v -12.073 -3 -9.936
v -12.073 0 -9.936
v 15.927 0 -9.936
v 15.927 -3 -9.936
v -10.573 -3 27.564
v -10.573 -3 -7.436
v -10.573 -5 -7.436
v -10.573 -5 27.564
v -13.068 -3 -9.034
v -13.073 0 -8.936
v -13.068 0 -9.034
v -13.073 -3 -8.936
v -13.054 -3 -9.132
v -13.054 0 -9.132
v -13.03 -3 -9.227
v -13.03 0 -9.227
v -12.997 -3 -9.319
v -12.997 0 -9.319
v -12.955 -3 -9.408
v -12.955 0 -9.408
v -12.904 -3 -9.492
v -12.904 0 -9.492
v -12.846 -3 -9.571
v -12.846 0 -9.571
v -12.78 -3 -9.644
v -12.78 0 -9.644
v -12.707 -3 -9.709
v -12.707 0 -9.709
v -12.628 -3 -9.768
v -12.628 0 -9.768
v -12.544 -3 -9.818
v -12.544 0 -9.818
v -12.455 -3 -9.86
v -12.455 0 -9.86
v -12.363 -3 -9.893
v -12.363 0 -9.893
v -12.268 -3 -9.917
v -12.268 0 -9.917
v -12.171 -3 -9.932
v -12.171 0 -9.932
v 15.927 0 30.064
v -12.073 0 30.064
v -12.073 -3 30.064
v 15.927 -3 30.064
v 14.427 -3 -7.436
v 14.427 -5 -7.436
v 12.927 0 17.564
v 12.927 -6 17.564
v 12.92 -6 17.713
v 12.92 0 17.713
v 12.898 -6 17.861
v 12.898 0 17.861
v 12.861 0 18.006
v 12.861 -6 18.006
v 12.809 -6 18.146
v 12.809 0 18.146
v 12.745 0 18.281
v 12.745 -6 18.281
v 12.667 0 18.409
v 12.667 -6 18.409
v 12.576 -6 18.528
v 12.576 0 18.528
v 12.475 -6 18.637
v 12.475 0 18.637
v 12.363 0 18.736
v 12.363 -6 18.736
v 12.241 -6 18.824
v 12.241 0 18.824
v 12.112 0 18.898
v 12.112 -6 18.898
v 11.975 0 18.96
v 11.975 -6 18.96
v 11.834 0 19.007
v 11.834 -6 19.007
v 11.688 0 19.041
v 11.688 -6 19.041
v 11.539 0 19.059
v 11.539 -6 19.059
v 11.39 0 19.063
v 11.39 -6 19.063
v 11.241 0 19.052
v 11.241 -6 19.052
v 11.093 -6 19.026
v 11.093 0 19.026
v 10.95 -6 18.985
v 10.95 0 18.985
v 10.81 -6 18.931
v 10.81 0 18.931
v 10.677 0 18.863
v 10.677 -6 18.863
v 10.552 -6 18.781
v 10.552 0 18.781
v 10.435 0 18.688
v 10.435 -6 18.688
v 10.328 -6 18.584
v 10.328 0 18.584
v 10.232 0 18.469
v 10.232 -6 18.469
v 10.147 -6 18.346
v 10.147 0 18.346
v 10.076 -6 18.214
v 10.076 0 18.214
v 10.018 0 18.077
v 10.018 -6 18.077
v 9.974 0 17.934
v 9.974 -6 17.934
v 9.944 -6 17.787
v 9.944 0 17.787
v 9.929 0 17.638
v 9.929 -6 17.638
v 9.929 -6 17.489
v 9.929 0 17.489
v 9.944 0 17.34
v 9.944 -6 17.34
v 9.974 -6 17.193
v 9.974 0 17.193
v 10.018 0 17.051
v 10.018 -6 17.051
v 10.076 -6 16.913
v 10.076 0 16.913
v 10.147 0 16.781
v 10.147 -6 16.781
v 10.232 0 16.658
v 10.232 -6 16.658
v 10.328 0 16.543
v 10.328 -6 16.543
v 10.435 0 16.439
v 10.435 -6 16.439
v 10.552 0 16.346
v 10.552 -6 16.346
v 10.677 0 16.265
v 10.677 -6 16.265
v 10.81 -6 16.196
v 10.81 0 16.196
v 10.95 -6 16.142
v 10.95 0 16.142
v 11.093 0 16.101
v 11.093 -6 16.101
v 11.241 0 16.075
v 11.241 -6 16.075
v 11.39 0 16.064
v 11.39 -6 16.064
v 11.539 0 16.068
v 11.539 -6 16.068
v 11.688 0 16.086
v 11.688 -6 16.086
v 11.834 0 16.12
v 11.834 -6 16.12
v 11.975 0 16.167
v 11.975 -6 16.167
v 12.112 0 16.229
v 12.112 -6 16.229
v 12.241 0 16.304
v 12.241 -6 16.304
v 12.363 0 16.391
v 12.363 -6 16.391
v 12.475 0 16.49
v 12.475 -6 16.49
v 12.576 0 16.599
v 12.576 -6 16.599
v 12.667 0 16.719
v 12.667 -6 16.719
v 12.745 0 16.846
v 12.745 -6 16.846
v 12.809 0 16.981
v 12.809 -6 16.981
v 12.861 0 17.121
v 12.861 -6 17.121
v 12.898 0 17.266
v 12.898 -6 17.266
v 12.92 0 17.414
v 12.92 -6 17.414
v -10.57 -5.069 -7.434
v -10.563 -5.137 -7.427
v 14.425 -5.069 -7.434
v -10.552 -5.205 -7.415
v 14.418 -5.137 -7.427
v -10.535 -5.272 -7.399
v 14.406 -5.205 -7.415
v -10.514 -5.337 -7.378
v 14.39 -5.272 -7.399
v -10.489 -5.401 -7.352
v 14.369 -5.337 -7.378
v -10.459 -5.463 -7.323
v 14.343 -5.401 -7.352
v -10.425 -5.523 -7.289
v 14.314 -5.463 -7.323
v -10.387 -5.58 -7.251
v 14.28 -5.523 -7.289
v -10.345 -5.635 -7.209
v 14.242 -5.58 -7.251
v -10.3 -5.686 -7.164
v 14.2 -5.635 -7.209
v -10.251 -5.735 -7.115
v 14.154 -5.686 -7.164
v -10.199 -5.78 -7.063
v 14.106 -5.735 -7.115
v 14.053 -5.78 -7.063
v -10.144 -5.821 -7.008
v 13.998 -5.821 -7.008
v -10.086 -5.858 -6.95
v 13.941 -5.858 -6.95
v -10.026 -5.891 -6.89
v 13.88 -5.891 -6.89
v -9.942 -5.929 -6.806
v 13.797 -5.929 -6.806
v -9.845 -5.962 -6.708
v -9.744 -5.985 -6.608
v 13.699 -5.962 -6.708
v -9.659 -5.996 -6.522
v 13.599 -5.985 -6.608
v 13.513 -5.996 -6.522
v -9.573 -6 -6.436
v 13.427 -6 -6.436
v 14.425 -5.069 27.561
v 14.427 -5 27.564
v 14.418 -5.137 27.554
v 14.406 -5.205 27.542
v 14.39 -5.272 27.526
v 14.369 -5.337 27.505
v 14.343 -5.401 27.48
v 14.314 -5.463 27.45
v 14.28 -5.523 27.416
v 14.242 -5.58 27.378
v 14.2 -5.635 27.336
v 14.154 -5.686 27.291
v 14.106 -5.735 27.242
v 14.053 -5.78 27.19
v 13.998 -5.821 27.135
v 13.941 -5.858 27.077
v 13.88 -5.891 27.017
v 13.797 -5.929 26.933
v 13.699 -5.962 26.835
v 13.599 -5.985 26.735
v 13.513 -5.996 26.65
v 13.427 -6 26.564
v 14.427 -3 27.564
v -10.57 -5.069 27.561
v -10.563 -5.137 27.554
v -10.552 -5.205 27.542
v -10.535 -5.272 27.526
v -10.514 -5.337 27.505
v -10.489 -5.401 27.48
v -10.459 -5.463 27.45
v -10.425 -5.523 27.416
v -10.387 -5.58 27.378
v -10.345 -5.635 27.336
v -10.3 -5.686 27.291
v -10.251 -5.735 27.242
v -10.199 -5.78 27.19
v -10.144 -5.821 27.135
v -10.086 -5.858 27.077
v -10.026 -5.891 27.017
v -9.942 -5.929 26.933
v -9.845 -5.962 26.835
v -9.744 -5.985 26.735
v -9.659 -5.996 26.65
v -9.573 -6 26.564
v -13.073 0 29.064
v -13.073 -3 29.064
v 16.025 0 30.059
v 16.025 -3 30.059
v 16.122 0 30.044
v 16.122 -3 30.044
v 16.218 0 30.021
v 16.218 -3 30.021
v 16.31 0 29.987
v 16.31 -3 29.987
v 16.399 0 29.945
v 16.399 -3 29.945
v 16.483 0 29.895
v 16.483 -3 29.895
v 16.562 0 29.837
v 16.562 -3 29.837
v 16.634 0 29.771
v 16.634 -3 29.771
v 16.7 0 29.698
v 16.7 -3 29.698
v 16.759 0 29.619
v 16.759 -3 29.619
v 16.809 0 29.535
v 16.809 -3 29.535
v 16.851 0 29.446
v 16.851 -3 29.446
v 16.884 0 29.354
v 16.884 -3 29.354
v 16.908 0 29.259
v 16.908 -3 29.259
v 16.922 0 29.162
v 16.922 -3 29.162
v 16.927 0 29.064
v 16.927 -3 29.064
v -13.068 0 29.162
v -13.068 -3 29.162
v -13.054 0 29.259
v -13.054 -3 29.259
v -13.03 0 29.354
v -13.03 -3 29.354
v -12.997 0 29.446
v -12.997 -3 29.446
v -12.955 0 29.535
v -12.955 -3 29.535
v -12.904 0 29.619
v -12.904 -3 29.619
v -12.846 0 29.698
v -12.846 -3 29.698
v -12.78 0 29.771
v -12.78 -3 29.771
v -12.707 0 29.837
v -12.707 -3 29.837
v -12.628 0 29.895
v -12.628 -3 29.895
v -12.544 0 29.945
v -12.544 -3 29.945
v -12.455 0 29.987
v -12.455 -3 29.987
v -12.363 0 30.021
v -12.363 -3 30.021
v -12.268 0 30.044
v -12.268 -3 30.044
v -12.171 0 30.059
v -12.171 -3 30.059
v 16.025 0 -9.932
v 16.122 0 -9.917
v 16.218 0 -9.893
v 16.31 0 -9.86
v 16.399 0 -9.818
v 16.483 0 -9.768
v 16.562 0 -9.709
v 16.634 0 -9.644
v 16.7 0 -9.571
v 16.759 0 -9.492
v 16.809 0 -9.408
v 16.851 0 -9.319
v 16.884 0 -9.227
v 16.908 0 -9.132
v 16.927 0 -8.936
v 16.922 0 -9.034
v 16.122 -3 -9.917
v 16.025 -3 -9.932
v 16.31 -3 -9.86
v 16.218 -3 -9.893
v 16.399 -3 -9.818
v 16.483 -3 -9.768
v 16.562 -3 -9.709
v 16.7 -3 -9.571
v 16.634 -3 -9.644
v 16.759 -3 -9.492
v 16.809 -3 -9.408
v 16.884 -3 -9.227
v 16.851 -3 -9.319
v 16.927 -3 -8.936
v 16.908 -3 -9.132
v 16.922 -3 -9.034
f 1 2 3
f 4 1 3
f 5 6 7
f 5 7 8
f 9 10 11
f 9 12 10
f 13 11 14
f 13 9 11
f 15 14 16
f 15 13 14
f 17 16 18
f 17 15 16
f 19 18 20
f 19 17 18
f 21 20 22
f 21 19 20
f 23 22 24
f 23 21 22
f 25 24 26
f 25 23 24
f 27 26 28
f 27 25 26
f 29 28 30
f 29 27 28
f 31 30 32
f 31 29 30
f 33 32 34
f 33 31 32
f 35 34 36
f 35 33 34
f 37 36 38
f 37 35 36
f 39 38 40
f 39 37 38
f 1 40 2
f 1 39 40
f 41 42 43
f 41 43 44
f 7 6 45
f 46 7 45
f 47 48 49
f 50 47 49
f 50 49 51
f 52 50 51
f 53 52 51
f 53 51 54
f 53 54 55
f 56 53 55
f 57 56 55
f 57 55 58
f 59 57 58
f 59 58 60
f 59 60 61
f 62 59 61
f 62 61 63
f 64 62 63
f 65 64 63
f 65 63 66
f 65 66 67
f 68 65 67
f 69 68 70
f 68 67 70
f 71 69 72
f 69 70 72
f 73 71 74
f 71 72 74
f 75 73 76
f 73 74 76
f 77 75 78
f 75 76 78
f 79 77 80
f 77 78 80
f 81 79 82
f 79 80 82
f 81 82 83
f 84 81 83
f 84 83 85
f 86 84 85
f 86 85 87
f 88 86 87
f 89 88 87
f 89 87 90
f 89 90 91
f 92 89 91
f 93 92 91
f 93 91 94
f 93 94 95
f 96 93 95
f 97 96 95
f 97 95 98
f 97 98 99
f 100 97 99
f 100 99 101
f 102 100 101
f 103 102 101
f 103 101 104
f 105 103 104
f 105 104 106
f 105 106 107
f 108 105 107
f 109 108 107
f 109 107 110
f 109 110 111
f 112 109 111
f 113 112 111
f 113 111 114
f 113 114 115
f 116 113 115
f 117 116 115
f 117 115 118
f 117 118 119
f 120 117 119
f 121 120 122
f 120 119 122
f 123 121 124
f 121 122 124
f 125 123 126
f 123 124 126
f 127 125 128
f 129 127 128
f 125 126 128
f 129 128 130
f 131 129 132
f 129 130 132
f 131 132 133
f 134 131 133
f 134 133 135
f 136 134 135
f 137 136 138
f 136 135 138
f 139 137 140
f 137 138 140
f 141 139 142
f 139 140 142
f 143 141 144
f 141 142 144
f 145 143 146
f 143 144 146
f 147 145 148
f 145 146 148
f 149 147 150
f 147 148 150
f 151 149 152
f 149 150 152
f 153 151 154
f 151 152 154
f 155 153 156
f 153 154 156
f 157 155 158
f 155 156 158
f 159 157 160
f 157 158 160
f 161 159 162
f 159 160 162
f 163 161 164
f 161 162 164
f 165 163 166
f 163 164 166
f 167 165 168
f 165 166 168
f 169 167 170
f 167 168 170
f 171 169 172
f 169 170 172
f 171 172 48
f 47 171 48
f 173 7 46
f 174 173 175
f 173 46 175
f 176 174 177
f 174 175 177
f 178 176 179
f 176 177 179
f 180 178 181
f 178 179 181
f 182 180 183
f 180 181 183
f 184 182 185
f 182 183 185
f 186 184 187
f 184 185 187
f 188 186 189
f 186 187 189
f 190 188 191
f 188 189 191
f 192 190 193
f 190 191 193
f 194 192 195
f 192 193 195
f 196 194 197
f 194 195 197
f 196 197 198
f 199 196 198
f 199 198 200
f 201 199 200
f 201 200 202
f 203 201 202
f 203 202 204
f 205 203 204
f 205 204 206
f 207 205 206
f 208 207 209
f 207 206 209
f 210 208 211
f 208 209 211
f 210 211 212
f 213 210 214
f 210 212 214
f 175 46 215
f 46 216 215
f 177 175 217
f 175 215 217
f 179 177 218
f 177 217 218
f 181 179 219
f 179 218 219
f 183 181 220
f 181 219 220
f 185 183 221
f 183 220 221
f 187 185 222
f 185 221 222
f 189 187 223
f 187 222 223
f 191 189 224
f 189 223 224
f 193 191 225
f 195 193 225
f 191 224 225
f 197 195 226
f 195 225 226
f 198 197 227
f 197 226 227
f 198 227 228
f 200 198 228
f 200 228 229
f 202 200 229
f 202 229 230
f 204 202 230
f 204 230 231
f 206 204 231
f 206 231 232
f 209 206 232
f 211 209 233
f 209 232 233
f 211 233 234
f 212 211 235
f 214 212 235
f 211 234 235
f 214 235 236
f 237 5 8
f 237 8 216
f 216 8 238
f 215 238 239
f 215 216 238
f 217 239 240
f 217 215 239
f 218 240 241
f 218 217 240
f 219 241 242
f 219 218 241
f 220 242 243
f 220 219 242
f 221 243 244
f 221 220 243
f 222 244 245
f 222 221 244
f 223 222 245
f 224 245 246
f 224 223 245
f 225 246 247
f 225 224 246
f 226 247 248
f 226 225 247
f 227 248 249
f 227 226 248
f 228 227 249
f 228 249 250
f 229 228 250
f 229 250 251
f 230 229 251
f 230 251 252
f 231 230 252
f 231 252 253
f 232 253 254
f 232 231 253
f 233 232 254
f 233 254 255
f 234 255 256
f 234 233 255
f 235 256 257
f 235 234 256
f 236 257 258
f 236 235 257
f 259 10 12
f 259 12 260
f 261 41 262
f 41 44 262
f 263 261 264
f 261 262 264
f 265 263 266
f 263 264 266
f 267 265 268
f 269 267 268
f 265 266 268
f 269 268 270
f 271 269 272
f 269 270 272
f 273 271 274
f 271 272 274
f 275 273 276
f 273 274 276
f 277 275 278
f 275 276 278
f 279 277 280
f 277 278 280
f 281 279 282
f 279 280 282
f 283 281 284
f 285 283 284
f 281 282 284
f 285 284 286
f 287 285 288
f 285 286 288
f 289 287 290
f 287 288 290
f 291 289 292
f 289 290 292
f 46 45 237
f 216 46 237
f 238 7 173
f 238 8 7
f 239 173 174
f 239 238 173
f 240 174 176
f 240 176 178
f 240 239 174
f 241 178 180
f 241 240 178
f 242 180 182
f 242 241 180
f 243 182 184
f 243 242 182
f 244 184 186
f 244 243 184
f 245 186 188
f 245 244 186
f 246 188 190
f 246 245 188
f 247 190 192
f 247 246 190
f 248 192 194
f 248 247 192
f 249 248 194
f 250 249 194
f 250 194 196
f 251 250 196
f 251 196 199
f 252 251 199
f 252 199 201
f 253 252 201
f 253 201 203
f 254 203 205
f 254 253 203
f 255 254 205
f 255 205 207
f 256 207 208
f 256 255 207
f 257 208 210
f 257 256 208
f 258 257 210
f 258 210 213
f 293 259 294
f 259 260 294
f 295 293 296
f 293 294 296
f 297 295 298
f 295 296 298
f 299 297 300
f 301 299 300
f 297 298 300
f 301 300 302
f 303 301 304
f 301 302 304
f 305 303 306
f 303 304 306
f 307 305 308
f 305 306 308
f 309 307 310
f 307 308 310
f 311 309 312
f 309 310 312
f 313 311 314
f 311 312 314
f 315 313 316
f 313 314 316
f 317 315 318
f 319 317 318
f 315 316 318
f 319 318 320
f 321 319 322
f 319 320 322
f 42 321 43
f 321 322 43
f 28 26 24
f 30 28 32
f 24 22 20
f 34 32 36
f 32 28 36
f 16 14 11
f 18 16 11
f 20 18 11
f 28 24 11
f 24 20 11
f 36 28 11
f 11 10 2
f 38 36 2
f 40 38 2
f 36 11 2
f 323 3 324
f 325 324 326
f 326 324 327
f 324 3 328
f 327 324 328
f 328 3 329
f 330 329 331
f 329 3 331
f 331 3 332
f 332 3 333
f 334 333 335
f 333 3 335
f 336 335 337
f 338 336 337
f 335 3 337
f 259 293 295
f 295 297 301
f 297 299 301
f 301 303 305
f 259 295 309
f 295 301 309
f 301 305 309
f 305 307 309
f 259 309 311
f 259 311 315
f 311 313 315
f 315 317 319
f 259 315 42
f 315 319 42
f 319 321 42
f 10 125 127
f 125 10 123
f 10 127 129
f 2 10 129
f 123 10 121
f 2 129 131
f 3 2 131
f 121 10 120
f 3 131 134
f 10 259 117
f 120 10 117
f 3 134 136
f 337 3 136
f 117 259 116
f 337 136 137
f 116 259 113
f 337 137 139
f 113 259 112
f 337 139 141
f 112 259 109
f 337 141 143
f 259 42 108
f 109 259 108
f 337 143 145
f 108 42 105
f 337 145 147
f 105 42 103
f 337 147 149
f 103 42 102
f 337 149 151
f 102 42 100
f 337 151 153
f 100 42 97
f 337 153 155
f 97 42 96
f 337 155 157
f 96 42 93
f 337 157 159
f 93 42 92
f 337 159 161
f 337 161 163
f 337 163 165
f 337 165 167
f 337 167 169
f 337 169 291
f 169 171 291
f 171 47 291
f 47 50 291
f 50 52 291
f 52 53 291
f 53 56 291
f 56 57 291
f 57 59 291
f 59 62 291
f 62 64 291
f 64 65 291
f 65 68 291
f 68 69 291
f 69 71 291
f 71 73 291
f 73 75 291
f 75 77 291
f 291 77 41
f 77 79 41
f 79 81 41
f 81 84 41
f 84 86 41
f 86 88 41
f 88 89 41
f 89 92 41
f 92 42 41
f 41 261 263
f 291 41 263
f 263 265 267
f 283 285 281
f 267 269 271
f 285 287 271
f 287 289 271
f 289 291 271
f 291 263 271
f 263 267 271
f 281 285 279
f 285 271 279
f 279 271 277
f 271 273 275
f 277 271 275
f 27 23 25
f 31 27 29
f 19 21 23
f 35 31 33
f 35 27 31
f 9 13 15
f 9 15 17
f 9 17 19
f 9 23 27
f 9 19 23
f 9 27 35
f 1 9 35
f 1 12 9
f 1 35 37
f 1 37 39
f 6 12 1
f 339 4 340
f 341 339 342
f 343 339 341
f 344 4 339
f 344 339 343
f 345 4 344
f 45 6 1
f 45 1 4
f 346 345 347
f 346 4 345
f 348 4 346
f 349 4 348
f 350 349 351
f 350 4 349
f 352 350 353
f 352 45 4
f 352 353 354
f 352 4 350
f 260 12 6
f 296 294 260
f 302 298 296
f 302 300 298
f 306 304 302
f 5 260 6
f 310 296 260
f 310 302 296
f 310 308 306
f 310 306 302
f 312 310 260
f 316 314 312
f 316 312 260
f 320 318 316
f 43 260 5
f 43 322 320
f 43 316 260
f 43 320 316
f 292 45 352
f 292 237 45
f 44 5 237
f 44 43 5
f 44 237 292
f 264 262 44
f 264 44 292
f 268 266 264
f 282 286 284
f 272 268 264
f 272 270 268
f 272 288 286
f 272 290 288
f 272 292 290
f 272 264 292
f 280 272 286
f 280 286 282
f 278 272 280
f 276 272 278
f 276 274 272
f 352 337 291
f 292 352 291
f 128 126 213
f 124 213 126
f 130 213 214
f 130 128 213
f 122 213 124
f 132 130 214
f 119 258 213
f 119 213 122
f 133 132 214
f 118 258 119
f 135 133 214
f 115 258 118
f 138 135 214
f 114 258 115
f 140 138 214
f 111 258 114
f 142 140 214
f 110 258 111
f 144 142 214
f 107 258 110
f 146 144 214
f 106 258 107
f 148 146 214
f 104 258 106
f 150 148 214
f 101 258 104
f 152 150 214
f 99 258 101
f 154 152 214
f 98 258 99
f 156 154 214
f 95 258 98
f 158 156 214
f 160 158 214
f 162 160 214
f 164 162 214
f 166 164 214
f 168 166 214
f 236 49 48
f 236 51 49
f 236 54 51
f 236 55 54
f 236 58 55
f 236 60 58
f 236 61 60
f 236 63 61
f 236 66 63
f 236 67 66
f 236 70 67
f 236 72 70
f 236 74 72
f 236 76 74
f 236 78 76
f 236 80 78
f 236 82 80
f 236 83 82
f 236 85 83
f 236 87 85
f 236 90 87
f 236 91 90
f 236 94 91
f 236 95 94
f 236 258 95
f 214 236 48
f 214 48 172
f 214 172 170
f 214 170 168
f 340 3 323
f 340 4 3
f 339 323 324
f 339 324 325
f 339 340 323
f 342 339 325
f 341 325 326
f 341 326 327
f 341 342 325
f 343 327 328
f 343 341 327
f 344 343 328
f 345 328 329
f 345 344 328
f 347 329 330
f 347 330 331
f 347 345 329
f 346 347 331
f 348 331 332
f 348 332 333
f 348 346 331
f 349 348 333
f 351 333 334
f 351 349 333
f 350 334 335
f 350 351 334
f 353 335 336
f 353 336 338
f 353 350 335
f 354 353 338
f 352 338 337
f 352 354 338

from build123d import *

# Parameters (mm, degrees)
F0_W     = 30
F0_H     = 40
F1_DEPTH = 3
F2_W     = 25
F2_H     = 35
F3_DEPTH = 3
F4_R     = 1
F5_R     = 1
F6_R     = 1.5
F7_DEPTH = 25


with BuildPart() as f1:
    # F0 (on Front) → F1 (new body)
    with BuildSketch(Plane.XZ):
        with Locations((1.927273, 10.06356)):
            Rectangle(F0_W, F0_H)
    extrude(amount=F1_DEPTH)

    # F2 (on face) → F3 (join)
    with BuildSketch(Plane.XZ.offset(3)):
        with Locations((1.927273, 10.06356)):
            Rectangle(F2_W, F2_H)
    extrude(amount=F3_DEPTH)

    # F4
    f4_edges = [f1.edges().sort_by_distance(p)[0] for p in [
        (-13.072727, -1.5, 30.06356),
        (-13.072727, -1.5, -9.93644),
        (16.927273, -1.5, -9.93644),
        (16.927273, -1.5, 30.06356),
    ]]
    fillet(f4_edges, radius=F4_R)

    # F5
    f5_edges = [f1.edges().sort_by_distance(p)[0] for p in [
        (14.427273, -6, 10.06356),
        (1.927273, -6, 27.56356),
        (-10.572727, -6, 10.06356),
        (1.927273, -6, -7.43644),
    ]]
    fillet(f5_edges, radius=F5_R)

    # F6 (on face) → F7 (cut)
    with BuildSketch(Plane.XZ.offset(6)):
        with Locations((11.427273, 17.56356)):
            Circle(F6_R)
    extrude(amount=-F7_DEPTH, mode=Mode.SUBTRACT)


solid = f1.part
